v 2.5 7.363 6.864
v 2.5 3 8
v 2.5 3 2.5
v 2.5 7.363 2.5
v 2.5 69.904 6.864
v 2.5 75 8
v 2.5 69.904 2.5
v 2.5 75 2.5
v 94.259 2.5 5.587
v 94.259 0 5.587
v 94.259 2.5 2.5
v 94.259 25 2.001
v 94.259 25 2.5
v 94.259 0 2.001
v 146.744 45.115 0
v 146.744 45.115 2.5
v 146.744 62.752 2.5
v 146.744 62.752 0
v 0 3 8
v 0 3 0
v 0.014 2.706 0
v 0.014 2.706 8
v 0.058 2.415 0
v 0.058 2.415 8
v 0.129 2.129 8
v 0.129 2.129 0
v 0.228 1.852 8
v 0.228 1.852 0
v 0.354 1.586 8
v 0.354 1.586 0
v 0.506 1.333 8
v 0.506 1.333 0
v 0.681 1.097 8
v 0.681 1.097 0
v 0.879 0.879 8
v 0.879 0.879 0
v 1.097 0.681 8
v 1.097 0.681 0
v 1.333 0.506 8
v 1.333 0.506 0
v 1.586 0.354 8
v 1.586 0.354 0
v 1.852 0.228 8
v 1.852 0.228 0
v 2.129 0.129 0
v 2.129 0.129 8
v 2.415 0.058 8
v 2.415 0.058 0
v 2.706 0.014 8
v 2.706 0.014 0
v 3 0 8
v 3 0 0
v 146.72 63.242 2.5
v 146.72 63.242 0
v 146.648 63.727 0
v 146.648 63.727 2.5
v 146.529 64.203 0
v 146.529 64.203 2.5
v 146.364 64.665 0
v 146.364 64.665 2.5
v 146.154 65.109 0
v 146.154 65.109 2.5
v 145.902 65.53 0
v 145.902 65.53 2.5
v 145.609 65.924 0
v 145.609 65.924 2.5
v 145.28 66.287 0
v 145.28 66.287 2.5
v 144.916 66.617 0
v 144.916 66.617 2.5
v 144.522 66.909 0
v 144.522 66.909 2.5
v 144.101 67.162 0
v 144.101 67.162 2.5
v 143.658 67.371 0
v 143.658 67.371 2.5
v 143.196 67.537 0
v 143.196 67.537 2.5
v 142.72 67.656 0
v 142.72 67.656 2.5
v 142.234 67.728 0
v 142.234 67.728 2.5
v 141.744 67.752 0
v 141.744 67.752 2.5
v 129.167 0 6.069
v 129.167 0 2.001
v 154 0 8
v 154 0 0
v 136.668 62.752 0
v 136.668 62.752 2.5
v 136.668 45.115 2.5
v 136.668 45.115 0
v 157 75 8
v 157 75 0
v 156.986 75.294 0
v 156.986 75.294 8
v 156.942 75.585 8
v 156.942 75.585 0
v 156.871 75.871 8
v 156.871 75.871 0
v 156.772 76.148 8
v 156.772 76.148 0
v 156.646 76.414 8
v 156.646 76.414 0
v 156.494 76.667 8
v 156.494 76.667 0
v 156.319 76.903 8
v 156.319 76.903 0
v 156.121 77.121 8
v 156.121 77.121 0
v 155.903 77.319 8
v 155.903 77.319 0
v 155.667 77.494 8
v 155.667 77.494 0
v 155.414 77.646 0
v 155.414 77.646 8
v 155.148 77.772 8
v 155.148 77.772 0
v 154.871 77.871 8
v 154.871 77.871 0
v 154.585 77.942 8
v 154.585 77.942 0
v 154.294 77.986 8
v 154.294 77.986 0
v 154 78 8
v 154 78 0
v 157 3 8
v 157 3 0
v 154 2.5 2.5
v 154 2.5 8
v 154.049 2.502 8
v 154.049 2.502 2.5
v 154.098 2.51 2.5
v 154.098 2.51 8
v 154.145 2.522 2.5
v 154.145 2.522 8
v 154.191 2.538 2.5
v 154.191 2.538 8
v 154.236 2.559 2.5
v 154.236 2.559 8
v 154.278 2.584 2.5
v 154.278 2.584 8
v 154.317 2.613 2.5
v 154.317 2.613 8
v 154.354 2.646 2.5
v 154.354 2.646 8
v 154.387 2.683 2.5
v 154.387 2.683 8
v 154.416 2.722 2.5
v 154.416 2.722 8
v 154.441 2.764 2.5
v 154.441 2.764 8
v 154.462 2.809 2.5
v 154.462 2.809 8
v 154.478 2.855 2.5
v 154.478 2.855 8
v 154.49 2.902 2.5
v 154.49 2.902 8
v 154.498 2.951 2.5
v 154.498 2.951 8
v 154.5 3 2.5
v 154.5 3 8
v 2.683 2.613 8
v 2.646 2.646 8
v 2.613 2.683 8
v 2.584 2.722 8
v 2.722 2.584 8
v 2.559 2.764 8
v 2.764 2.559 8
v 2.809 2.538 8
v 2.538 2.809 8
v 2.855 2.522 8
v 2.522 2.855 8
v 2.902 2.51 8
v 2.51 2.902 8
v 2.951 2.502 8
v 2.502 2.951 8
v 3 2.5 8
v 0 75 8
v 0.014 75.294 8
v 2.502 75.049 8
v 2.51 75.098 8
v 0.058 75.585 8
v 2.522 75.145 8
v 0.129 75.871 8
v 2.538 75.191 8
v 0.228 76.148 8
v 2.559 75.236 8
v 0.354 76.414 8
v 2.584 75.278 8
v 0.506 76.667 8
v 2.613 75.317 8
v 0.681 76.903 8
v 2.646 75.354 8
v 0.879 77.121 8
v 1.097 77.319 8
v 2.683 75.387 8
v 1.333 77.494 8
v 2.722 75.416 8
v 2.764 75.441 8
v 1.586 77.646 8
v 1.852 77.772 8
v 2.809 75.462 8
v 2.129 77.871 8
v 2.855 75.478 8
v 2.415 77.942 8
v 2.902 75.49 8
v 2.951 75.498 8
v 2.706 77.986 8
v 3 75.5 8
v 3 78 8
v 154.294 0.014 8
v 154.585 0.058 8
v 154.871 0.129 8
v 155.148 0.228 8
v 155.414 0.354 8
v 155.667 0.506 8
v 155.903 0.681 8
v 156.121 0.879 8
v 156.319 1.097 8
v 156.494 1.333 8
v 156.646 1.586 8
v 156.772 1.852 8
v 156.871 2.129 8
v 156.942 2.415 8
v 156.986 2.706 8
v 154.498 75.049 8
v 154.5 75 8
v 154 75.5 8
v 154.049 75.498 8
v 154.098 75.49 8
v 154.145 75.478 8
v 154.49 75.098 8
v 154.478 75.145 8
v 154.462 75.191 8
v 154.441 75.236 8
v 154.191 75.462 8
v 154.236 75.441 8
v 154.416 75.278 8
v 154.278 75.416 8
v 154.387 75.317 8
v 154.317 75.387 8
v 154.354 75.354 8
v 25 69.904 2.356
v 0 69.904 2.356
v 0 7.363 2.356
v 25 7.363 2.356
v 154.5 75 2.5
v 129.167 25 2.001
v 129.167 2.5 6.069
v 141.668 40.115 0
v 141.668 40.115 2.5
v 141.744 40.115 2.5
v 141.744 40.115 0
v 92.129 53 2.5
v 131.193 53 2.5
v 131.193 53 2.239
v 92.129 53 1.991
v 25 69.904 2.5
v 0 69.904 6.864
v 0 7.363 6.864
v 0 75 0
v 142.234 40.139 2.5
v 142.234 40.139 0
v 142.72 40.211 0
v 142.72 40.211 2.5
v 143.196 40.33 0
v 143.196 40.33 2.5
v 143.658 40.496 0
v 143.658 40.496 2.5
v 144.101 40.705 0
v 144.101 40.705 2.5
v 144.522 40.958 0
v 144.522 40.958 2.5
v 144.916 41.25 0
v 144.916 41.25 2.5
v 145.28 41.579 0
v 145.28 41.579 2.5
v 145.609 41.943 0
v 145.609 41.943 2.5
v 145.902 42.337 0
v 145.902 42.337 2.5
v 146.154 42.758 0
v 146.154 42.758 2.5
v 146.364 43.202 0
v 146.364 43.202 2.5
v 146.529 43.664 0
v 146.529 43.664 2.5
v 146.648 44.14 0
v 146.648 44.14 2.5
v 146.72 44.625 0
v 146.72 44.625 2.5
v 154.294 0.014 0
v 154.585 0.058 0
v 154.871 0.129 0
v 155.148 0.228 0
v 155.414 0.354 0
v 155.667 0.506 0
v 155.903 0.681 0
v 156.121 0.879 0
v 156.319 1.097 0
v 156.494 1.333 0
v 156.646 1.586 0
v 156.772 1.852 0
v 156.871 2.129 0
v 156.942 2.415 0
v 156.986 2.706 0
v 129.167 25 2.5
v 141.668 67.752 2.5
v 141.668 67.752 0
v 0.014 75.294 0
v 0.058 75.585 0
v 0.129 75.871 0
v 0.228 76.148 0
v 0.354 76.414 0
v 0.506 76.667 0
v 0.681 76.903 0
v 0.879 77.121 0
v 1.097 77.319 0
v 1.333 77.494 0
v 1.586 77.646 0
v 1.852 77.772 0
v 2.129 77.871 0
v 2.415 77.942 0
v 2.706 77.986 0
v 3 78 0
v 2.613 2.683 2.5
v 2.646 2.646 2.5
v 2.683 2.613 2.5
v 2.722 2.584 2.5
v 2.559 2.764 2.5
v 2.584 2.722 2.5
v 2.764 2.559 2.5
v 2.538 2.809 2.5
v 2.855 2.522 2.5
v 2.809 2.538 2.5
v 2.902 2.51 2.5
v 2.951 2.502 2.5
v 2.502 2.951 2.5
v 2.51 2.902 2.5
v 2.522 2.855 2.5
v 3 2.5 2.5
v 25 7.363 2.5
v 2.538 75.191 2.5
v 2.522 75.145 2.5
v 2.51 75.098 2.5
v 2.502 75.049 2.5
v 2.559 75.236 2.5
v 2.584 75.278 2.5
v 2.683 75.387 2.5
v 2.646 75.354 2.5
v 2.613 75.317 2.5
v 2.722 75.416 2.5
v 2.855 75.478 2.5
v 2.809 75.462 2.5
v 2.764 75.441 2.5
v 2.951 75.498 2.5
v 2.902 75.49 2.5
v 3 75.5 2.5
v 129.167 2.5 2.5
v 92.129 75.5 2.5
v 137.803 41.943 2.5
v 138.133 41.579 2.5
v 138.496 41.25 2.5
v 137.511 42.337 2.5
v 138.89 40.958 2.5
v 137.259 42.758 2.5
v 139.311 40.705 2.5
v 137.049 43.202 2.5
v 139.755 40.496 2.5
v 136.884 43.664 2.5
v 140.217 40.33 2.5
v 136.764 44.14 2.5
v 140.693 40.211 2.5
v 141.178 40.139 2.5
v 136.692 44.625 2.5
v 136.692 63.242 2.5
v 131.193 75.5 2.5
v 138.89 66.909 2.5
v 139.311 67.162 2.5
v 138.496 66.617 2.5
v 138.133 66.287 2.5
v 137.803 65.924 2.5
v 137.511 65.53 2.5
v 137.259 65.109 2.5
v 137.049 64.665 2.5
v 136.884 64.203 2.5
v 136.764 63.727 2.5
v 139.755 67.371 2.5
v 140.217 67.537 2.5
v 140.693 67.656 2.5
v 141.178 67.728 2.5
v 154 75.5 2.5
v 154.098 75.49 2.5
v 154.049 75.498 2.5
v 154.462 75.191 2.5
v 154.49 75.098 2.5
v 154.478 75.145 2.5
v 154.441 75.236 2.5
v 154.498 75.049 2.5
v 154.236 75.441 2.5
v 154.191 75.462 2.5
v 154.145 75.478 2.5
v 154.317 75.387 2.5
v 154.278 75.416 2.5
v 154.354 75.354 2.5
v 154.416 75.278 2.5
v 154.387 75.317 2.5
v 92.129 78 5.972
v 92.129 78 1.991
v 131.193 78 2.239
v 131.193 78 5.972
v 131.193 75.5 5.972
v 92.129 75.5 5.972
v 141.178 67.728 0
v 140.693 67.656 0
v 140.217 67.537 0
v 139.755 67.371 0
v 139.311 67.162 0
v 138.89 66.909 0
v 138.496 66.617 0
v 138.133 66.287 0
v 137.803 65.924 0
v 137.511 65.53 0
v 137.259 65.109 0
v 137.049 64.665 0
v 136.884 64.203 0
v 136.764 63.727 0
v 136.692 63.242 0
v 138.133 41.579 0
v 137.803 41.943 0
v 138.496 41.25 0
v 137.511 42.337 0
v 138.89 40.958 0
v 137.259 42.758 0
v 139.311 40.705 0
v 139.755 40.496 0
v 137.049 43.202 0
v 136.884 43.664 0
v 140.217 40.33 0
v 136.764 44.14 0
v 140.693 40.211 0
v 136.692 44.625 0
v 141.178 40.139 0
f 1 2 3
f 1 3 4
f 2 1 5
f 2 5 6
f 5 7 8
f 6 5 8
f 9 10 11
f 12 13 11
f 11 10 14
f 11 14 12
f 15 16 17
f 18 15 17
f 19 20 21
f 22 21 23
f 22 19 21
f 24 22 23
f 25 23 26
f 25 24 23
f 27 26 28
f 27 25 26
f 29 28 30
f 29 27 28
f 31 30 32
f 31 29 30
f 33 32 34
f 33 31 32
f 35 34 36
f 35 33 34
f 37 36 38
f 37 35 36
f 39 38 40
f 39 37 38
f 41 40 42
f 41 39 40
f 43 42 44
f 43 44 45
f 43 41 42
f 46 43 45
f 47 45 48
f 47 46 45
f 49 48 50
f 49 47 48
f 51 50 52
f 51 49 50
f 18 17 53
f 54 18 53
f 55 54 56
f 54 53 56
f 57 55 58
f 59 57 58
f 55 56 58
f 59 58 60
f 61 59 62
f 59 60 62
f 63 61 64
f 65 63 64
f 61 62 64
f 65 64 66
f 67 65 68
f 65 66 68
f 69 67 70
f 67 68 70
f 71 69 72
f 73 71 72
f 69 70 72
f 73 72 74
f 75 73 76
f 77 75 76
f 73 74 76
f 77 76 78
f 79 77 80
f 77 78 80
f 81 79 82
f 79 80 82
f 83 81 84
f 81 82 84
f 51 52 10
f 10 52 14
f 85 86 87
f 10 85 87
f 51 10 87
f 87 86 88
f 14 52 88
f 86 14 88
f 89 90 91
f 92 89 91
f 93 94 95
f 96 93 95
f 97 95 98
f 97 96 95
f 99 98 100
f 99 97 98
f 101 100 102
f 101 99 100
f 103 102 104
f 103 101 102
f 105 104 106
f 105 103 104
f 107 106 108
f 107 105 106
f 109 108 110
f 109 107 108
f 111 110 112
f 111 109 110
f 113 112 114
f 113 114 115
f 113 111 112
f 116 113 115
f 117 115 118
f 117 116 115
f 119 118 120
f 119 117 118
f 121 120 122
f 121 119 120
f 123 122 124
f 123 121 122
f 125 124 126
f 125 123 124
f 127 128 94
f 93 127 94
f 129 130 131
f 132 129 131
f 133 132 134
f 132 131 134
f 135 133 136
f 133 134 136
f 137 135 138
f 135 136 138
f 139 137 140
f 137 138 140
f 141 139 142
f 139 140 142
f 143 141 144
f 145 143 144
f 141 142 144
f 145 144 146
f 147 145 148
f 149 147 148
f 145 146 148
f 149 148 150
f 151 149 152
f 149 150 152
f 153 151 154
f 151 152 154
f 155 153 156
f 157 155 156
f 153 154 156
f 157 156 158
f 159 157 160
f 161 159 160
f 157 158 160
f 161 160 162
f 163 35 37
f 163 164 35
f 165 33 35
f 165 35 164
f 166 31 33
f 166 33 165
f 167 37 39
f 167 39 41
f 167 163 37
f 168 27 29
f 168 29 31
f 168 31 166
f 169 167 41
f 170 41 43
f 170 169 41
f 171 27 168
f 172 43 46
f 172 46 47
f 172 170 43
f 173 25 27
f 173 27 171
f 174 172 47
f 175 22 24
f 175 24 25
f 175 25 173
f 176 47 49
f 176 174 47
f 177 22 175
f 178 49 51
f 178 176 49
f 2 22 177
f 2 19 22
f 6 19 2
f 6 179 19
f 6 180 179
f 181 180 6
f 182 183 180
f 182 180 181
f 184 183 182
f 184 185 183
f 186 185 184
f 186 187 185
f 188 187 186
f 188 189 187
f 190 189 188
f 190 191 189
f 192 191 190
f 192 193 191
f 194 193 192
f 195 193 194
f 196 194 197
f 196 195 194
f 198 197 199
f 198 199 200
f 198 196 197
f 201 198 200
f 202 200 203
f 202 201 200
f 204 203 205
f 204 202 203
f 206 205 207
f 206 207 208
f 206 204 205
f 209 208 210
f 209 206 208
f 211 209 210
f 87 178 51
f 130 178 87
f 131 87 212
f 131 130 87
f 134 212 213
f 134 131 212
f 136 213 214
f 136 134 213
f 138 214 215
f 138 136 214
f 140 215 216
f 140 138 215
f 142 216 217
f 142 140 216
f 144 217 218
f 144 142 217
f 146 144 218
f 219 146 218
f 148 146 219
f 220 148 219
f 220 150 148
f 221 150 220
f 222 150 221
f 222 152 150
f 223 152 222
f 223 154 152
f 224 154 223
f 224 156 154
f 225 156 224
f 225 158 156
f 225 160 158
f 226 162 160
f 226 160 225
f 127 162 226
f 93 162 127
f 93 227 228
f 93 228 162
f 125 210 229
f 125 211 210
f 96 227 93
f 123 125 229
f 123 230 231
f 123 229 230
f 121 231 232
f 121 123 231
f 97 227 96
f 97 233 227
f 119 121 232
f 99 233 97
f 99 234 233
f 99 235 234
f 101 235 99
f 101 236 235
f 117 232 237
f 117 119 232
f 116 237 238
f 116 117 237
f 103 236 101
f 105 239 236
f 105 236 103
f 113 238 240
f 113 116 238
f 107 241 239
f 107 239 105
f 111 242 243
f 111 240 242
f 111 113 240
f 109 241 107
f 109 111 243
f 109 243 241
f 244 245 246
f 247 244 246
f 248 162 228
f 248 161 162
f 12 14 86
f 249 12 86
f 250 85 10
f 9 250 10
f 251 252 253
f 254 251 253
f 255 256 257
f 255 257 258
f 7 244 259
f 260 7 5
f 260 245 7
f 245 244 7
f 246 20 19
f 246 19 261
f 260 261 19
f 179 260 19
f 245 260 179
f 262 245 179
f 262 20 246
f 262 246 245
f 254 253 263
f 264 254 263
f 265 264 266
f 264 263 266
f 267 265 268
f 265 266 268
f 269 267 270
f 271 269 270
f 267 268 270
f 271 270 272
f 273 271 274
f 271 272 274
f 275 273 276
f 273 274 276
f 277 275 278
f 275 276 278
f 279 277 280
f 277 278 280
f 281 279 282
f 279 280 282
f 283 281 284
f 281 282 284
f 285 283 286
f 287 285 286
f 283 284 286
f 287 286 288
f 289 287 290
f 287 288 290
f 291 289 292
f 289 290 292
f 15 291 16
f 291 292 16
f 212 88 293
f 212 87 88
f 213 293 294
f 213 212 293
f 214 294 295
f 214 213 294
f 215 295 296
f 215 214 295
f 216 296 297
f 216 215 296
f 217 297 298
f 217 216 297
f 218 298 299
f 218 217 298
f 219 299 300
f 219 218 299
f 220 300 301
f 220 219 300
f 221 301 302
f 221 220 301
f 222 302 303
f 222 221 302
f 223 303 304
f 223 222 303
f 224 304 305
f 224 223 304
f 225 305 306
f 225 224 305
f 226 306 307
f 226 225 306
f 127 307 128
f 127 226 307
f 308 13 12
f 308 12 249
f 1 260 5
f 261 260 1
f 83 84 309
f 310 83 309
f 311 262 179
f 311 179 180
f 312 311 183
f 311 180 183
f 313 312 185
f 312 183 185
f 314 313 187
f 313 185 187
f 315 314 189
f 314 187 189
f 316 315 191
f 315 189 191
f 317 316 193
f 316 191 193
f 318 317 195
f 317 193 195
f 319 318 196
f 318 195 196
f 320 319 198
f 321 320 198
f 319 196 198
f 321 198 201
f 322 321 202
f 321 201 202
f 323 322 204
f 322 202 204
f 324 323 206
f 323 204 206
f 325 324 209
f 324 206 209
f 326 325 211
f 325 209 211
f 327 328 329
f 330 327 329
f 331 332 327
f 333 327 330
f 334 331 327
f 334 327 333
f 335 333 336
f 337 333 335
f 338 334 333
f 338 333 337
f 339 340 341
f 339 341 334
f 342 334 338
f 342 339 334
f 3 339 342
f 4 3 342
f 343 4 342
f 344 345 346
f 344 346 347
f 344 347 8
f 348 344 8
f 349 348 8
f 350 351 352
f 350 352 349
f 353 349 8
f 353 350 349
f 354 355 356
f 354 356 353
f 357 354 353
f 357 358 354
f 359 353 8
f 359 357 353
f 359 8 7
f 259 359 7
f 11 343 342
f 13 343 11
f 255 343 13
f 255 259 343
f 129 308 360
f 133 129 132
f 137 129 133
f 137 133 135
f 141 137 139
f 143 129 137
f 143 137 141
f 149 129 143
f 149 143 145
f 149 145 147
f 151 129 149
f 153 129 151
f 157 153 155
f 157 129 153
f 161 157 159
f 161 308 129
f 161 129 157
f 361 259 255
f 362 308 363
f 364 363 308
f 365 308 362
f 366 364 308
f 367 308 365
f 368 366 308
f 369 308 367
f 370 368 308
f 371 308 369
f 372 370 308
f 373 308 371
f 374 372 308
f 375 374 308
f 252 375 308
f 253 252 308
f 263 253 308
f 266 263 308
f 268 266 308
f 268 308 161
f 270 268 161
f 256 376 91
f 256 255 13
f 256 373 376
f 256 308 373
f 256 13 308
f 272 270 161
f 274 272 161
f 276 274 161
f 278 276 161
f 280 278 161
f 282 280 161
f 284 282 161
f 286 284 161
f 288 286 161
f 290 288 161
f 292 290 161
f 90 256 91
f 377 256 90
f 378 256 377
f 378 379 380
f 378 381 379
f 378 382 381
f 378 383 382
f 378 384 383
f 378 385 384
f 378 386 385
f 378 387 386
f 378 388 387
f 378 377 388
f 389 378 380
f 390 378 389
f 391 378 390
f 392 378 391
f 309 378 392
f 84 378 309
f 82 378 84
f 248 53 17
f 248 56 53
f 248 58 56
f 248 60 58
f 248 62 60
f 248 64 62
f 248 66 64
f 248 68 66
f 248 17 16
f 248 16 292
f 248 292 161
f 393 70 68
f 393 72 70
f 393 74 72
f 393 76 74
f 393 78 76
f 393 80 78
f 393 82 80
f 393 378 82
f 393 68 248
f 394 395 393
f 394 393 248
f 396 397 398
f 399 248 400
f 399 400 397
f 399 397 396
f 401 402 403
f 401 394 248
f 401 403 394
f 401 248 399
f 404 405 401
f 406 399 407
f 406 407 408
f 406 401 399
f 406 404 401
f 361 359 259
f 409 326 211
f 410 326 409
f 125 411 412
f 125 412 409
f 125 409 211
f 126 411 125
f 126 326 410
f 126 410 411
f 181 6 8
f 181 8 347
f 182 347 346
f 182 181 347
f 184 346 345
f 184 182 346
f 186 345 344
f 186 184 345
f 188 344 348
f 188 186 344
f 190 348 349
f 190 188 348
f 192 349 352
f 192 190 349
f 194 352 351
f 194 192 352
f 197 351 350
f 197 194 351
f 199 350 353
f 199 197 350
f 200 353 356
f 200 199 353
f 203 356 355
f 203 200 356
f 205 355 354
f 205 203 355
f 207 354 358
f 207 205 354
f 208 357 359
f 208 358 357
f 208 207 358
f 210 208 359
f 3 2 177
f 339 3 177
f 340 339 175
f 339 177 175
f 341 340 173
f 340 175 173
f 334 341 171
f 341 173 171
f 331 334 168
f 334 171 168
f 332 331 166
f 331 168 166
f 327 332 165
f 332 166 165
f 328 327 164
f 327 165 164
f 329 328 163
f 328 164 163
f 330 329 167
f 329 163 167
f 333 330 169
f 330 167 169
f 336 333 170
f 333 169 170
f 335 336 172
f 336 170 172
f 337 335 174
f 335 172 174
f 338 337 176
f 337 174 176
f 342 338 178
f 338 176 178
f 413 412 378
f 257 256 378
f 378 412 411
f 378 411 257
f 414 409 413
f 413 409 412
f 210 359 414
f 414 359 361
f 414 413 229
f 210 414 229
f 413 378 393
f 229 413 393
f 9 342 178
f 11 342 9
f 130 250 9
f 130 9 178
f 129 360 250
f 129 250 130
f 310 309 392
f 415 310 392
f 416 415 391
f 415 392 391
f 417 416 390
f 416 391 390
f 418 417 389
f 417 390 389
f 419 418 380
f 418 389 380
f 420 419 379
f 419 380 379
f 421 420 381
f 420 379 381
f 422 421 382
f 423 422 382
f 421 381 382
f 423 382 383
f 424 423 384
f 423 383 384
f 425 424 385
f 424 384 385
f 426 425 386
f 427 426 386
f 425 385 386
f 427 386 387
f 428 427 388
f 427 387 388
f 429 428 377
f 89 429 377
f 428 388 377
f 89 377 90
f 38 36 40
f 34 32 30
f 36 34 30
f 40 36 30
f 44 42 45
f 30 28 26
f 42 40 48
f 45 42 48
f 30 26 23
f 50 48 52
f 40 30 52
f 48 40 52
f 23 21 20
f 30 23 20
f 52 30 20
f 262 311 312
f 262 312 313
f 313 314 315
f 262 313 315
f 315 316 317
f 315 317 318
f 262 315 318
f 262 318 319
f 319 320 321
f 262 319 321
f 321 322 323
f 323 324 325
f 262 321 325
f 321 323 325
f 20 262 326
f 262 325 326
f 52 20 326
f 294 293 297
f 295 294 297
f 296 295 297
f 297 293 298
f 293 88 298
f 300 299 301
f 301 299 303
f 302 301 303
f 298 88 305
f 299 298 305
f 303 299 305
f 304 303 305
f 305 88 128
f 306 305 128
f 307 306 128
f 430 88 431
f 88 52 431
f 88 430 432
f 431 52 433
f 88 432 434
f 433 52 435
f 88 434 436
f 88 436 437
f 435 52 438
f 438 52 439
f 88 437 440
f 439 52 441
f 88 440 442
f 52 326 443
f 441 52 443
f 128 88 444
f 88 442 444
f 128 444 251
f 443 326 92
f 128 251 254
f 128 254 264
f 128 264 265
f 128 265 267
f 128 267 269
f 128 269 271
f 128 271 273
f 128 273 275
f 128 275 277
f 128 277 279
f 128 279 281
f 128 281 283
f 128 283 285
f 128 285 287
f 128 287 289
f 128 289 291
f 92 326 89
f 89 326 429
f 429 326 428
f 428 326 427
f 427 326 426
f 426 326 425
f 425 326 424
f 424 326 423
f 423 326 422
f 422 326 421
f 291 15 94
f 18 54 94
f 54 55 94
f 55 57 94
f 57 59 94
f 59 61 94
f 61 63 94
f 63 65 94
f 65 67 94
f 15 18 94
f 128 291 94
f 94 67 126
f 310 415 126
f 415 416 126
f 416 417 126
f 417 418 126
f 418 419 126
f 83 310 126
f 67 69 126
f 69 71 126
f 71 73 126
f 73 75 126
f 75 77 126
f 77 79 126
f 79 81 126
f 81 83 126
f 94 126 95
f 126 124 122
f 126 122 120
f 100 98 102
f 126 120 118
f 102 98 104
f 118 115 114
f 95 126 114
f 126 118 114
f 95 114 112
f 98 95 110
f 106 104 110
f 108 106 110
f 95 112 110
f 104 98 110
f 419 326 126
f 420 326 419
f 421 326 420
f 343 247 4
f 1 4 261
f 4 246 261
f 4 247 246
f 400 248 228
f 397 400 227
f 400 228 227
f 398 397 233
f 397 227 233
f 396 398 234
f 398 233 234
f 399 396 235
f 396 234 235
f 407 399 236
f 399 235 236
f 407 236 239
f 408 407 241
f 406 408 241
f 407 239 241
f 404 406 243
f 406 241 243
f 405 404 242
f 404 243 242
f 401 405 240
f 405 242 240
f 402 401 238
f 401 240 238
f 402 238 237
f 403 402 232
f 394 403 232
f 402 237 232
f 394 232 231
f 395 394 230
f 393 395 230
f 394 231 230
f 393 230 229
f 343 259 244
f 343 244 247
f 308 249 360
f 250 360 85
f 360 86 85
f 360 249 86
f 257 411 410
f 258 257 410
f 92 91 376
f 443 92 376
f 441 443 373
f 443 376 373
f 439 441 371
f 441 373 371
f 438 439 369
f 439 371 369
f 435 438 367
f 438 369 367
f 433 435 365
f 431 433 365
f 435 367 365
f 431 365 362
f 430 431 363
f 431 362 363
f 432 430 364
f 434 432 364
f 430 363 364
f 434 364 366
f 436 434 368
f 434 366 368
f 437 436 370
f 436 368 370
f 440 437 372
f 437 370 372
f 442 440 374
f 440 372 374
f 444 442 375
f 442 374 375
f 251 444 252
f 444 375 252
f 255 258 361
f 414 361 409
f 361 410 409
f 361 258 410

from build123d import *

# Parameters (mm, degrees)
F0_W      = 157
F0_H      = 78
F1_DEPTH  = 8
F2_R      = 3
F3_T      = -2.5
F5_DEPTH  = 25
F7_W      = 62.540936
F7_H      = 4.507454
F8_DEPTH  = 25
F11_DEPTH = 25
F12_DEPTH = 25


with BuildPart() as f1:
    # F0 (on Top) → F1 (new body)
    with BuildSketch(Plane.XY):
        with Locations((78.5, 39)):
            Rectangle(F0_W, F0_H)
    extrude(amount=F1_DEPTH)

    # F2
    f2_edges = [f1.edges().sort_by_distance(p)[0] for p in [
        (157, 0, 4),
        (157, 78, 4),
        (0, 78, 4),
        (0, 0, 4),
    ]]
    fillet(f2_edges, radius=F2_R)

    # F3
    f3_openings = [f1.faces().sort_by_distance(p)[0] for p in [
        (78.5, 39, 8),
    ]]
    offset(amount=F3_T, openings=f3_openings)

    # F4 (on face) → F5 (cut)
    with BuildSketch(Plane.XY.offset(2.5)):
        with BuildLine():
            ThreePointArc((146.744221, 62.751937), (145.279755, 66.287471), (141.744221, 67.751937))
            Line((141.744221, 67.751937), (141.66825, 67.751937))
            ThreePointArc((141.66825, 67.751937), (138.132716, 66.287471), (136.66825, 62.751937))
            Line((136.66825, 62.751937), (136.66825, 45.115006))
            ThreePointArc((136.66825, 45.115006), (138.132716, 41.579472), (141.66825, 40.115006))
            Line((141.66825, 40.115006), (141.744221, 40.115006))
            ThreePointArc((141.744221, 40.115006), (145.279755, 41.579472), (146.744221, 45.115006))
            Line((146.744221, 45.115006), (146.744221, 62.751937))
        make_face()
    extrude(amount=-F5_DEPTH, mode=Mode.SUBTRACT)

    # F7 (on face) → F8 (cut)
    with BuildSketch(Plane(origin=(0, 0, 0), x_dir=(0, -1, 0), z_dir=(-1, 0, 0))):
        with Locations((-38.633815, 4.610173)):
            Rectangle(F7_W, F7_H)
    extrude(amount=-F8_DEPTH, mode=Mode.SUBTRACT)

    # F10 (on face) → F11 (cut)
    with BuildSketch(Plane.XZ):
        Polygon((129.16705, 6.068889), (94.259493, 5.586785), (94.259493, 2.000924), (129.16705, 2.000924), align=None)
    extrude(amount=-F11_DEPTH, mode=Mode.SUBTRACT)

    # F9 (on face) → F12 (cut)
    with BuildSketch(Plane(origin=(0, 78, 0), x_dir=(-1, 0, 0), z_dir=(0, 1, 0))):
        Polygon((-131.193131, 2.239336), (-92.129149, 1.990521), (-92.129149, 5.971564), (-131.193131, 5.971564), align=None)
    extrude(amount=-F12_DEPTH, mode=Mode.SUBTRACT)


solid = f1.part
